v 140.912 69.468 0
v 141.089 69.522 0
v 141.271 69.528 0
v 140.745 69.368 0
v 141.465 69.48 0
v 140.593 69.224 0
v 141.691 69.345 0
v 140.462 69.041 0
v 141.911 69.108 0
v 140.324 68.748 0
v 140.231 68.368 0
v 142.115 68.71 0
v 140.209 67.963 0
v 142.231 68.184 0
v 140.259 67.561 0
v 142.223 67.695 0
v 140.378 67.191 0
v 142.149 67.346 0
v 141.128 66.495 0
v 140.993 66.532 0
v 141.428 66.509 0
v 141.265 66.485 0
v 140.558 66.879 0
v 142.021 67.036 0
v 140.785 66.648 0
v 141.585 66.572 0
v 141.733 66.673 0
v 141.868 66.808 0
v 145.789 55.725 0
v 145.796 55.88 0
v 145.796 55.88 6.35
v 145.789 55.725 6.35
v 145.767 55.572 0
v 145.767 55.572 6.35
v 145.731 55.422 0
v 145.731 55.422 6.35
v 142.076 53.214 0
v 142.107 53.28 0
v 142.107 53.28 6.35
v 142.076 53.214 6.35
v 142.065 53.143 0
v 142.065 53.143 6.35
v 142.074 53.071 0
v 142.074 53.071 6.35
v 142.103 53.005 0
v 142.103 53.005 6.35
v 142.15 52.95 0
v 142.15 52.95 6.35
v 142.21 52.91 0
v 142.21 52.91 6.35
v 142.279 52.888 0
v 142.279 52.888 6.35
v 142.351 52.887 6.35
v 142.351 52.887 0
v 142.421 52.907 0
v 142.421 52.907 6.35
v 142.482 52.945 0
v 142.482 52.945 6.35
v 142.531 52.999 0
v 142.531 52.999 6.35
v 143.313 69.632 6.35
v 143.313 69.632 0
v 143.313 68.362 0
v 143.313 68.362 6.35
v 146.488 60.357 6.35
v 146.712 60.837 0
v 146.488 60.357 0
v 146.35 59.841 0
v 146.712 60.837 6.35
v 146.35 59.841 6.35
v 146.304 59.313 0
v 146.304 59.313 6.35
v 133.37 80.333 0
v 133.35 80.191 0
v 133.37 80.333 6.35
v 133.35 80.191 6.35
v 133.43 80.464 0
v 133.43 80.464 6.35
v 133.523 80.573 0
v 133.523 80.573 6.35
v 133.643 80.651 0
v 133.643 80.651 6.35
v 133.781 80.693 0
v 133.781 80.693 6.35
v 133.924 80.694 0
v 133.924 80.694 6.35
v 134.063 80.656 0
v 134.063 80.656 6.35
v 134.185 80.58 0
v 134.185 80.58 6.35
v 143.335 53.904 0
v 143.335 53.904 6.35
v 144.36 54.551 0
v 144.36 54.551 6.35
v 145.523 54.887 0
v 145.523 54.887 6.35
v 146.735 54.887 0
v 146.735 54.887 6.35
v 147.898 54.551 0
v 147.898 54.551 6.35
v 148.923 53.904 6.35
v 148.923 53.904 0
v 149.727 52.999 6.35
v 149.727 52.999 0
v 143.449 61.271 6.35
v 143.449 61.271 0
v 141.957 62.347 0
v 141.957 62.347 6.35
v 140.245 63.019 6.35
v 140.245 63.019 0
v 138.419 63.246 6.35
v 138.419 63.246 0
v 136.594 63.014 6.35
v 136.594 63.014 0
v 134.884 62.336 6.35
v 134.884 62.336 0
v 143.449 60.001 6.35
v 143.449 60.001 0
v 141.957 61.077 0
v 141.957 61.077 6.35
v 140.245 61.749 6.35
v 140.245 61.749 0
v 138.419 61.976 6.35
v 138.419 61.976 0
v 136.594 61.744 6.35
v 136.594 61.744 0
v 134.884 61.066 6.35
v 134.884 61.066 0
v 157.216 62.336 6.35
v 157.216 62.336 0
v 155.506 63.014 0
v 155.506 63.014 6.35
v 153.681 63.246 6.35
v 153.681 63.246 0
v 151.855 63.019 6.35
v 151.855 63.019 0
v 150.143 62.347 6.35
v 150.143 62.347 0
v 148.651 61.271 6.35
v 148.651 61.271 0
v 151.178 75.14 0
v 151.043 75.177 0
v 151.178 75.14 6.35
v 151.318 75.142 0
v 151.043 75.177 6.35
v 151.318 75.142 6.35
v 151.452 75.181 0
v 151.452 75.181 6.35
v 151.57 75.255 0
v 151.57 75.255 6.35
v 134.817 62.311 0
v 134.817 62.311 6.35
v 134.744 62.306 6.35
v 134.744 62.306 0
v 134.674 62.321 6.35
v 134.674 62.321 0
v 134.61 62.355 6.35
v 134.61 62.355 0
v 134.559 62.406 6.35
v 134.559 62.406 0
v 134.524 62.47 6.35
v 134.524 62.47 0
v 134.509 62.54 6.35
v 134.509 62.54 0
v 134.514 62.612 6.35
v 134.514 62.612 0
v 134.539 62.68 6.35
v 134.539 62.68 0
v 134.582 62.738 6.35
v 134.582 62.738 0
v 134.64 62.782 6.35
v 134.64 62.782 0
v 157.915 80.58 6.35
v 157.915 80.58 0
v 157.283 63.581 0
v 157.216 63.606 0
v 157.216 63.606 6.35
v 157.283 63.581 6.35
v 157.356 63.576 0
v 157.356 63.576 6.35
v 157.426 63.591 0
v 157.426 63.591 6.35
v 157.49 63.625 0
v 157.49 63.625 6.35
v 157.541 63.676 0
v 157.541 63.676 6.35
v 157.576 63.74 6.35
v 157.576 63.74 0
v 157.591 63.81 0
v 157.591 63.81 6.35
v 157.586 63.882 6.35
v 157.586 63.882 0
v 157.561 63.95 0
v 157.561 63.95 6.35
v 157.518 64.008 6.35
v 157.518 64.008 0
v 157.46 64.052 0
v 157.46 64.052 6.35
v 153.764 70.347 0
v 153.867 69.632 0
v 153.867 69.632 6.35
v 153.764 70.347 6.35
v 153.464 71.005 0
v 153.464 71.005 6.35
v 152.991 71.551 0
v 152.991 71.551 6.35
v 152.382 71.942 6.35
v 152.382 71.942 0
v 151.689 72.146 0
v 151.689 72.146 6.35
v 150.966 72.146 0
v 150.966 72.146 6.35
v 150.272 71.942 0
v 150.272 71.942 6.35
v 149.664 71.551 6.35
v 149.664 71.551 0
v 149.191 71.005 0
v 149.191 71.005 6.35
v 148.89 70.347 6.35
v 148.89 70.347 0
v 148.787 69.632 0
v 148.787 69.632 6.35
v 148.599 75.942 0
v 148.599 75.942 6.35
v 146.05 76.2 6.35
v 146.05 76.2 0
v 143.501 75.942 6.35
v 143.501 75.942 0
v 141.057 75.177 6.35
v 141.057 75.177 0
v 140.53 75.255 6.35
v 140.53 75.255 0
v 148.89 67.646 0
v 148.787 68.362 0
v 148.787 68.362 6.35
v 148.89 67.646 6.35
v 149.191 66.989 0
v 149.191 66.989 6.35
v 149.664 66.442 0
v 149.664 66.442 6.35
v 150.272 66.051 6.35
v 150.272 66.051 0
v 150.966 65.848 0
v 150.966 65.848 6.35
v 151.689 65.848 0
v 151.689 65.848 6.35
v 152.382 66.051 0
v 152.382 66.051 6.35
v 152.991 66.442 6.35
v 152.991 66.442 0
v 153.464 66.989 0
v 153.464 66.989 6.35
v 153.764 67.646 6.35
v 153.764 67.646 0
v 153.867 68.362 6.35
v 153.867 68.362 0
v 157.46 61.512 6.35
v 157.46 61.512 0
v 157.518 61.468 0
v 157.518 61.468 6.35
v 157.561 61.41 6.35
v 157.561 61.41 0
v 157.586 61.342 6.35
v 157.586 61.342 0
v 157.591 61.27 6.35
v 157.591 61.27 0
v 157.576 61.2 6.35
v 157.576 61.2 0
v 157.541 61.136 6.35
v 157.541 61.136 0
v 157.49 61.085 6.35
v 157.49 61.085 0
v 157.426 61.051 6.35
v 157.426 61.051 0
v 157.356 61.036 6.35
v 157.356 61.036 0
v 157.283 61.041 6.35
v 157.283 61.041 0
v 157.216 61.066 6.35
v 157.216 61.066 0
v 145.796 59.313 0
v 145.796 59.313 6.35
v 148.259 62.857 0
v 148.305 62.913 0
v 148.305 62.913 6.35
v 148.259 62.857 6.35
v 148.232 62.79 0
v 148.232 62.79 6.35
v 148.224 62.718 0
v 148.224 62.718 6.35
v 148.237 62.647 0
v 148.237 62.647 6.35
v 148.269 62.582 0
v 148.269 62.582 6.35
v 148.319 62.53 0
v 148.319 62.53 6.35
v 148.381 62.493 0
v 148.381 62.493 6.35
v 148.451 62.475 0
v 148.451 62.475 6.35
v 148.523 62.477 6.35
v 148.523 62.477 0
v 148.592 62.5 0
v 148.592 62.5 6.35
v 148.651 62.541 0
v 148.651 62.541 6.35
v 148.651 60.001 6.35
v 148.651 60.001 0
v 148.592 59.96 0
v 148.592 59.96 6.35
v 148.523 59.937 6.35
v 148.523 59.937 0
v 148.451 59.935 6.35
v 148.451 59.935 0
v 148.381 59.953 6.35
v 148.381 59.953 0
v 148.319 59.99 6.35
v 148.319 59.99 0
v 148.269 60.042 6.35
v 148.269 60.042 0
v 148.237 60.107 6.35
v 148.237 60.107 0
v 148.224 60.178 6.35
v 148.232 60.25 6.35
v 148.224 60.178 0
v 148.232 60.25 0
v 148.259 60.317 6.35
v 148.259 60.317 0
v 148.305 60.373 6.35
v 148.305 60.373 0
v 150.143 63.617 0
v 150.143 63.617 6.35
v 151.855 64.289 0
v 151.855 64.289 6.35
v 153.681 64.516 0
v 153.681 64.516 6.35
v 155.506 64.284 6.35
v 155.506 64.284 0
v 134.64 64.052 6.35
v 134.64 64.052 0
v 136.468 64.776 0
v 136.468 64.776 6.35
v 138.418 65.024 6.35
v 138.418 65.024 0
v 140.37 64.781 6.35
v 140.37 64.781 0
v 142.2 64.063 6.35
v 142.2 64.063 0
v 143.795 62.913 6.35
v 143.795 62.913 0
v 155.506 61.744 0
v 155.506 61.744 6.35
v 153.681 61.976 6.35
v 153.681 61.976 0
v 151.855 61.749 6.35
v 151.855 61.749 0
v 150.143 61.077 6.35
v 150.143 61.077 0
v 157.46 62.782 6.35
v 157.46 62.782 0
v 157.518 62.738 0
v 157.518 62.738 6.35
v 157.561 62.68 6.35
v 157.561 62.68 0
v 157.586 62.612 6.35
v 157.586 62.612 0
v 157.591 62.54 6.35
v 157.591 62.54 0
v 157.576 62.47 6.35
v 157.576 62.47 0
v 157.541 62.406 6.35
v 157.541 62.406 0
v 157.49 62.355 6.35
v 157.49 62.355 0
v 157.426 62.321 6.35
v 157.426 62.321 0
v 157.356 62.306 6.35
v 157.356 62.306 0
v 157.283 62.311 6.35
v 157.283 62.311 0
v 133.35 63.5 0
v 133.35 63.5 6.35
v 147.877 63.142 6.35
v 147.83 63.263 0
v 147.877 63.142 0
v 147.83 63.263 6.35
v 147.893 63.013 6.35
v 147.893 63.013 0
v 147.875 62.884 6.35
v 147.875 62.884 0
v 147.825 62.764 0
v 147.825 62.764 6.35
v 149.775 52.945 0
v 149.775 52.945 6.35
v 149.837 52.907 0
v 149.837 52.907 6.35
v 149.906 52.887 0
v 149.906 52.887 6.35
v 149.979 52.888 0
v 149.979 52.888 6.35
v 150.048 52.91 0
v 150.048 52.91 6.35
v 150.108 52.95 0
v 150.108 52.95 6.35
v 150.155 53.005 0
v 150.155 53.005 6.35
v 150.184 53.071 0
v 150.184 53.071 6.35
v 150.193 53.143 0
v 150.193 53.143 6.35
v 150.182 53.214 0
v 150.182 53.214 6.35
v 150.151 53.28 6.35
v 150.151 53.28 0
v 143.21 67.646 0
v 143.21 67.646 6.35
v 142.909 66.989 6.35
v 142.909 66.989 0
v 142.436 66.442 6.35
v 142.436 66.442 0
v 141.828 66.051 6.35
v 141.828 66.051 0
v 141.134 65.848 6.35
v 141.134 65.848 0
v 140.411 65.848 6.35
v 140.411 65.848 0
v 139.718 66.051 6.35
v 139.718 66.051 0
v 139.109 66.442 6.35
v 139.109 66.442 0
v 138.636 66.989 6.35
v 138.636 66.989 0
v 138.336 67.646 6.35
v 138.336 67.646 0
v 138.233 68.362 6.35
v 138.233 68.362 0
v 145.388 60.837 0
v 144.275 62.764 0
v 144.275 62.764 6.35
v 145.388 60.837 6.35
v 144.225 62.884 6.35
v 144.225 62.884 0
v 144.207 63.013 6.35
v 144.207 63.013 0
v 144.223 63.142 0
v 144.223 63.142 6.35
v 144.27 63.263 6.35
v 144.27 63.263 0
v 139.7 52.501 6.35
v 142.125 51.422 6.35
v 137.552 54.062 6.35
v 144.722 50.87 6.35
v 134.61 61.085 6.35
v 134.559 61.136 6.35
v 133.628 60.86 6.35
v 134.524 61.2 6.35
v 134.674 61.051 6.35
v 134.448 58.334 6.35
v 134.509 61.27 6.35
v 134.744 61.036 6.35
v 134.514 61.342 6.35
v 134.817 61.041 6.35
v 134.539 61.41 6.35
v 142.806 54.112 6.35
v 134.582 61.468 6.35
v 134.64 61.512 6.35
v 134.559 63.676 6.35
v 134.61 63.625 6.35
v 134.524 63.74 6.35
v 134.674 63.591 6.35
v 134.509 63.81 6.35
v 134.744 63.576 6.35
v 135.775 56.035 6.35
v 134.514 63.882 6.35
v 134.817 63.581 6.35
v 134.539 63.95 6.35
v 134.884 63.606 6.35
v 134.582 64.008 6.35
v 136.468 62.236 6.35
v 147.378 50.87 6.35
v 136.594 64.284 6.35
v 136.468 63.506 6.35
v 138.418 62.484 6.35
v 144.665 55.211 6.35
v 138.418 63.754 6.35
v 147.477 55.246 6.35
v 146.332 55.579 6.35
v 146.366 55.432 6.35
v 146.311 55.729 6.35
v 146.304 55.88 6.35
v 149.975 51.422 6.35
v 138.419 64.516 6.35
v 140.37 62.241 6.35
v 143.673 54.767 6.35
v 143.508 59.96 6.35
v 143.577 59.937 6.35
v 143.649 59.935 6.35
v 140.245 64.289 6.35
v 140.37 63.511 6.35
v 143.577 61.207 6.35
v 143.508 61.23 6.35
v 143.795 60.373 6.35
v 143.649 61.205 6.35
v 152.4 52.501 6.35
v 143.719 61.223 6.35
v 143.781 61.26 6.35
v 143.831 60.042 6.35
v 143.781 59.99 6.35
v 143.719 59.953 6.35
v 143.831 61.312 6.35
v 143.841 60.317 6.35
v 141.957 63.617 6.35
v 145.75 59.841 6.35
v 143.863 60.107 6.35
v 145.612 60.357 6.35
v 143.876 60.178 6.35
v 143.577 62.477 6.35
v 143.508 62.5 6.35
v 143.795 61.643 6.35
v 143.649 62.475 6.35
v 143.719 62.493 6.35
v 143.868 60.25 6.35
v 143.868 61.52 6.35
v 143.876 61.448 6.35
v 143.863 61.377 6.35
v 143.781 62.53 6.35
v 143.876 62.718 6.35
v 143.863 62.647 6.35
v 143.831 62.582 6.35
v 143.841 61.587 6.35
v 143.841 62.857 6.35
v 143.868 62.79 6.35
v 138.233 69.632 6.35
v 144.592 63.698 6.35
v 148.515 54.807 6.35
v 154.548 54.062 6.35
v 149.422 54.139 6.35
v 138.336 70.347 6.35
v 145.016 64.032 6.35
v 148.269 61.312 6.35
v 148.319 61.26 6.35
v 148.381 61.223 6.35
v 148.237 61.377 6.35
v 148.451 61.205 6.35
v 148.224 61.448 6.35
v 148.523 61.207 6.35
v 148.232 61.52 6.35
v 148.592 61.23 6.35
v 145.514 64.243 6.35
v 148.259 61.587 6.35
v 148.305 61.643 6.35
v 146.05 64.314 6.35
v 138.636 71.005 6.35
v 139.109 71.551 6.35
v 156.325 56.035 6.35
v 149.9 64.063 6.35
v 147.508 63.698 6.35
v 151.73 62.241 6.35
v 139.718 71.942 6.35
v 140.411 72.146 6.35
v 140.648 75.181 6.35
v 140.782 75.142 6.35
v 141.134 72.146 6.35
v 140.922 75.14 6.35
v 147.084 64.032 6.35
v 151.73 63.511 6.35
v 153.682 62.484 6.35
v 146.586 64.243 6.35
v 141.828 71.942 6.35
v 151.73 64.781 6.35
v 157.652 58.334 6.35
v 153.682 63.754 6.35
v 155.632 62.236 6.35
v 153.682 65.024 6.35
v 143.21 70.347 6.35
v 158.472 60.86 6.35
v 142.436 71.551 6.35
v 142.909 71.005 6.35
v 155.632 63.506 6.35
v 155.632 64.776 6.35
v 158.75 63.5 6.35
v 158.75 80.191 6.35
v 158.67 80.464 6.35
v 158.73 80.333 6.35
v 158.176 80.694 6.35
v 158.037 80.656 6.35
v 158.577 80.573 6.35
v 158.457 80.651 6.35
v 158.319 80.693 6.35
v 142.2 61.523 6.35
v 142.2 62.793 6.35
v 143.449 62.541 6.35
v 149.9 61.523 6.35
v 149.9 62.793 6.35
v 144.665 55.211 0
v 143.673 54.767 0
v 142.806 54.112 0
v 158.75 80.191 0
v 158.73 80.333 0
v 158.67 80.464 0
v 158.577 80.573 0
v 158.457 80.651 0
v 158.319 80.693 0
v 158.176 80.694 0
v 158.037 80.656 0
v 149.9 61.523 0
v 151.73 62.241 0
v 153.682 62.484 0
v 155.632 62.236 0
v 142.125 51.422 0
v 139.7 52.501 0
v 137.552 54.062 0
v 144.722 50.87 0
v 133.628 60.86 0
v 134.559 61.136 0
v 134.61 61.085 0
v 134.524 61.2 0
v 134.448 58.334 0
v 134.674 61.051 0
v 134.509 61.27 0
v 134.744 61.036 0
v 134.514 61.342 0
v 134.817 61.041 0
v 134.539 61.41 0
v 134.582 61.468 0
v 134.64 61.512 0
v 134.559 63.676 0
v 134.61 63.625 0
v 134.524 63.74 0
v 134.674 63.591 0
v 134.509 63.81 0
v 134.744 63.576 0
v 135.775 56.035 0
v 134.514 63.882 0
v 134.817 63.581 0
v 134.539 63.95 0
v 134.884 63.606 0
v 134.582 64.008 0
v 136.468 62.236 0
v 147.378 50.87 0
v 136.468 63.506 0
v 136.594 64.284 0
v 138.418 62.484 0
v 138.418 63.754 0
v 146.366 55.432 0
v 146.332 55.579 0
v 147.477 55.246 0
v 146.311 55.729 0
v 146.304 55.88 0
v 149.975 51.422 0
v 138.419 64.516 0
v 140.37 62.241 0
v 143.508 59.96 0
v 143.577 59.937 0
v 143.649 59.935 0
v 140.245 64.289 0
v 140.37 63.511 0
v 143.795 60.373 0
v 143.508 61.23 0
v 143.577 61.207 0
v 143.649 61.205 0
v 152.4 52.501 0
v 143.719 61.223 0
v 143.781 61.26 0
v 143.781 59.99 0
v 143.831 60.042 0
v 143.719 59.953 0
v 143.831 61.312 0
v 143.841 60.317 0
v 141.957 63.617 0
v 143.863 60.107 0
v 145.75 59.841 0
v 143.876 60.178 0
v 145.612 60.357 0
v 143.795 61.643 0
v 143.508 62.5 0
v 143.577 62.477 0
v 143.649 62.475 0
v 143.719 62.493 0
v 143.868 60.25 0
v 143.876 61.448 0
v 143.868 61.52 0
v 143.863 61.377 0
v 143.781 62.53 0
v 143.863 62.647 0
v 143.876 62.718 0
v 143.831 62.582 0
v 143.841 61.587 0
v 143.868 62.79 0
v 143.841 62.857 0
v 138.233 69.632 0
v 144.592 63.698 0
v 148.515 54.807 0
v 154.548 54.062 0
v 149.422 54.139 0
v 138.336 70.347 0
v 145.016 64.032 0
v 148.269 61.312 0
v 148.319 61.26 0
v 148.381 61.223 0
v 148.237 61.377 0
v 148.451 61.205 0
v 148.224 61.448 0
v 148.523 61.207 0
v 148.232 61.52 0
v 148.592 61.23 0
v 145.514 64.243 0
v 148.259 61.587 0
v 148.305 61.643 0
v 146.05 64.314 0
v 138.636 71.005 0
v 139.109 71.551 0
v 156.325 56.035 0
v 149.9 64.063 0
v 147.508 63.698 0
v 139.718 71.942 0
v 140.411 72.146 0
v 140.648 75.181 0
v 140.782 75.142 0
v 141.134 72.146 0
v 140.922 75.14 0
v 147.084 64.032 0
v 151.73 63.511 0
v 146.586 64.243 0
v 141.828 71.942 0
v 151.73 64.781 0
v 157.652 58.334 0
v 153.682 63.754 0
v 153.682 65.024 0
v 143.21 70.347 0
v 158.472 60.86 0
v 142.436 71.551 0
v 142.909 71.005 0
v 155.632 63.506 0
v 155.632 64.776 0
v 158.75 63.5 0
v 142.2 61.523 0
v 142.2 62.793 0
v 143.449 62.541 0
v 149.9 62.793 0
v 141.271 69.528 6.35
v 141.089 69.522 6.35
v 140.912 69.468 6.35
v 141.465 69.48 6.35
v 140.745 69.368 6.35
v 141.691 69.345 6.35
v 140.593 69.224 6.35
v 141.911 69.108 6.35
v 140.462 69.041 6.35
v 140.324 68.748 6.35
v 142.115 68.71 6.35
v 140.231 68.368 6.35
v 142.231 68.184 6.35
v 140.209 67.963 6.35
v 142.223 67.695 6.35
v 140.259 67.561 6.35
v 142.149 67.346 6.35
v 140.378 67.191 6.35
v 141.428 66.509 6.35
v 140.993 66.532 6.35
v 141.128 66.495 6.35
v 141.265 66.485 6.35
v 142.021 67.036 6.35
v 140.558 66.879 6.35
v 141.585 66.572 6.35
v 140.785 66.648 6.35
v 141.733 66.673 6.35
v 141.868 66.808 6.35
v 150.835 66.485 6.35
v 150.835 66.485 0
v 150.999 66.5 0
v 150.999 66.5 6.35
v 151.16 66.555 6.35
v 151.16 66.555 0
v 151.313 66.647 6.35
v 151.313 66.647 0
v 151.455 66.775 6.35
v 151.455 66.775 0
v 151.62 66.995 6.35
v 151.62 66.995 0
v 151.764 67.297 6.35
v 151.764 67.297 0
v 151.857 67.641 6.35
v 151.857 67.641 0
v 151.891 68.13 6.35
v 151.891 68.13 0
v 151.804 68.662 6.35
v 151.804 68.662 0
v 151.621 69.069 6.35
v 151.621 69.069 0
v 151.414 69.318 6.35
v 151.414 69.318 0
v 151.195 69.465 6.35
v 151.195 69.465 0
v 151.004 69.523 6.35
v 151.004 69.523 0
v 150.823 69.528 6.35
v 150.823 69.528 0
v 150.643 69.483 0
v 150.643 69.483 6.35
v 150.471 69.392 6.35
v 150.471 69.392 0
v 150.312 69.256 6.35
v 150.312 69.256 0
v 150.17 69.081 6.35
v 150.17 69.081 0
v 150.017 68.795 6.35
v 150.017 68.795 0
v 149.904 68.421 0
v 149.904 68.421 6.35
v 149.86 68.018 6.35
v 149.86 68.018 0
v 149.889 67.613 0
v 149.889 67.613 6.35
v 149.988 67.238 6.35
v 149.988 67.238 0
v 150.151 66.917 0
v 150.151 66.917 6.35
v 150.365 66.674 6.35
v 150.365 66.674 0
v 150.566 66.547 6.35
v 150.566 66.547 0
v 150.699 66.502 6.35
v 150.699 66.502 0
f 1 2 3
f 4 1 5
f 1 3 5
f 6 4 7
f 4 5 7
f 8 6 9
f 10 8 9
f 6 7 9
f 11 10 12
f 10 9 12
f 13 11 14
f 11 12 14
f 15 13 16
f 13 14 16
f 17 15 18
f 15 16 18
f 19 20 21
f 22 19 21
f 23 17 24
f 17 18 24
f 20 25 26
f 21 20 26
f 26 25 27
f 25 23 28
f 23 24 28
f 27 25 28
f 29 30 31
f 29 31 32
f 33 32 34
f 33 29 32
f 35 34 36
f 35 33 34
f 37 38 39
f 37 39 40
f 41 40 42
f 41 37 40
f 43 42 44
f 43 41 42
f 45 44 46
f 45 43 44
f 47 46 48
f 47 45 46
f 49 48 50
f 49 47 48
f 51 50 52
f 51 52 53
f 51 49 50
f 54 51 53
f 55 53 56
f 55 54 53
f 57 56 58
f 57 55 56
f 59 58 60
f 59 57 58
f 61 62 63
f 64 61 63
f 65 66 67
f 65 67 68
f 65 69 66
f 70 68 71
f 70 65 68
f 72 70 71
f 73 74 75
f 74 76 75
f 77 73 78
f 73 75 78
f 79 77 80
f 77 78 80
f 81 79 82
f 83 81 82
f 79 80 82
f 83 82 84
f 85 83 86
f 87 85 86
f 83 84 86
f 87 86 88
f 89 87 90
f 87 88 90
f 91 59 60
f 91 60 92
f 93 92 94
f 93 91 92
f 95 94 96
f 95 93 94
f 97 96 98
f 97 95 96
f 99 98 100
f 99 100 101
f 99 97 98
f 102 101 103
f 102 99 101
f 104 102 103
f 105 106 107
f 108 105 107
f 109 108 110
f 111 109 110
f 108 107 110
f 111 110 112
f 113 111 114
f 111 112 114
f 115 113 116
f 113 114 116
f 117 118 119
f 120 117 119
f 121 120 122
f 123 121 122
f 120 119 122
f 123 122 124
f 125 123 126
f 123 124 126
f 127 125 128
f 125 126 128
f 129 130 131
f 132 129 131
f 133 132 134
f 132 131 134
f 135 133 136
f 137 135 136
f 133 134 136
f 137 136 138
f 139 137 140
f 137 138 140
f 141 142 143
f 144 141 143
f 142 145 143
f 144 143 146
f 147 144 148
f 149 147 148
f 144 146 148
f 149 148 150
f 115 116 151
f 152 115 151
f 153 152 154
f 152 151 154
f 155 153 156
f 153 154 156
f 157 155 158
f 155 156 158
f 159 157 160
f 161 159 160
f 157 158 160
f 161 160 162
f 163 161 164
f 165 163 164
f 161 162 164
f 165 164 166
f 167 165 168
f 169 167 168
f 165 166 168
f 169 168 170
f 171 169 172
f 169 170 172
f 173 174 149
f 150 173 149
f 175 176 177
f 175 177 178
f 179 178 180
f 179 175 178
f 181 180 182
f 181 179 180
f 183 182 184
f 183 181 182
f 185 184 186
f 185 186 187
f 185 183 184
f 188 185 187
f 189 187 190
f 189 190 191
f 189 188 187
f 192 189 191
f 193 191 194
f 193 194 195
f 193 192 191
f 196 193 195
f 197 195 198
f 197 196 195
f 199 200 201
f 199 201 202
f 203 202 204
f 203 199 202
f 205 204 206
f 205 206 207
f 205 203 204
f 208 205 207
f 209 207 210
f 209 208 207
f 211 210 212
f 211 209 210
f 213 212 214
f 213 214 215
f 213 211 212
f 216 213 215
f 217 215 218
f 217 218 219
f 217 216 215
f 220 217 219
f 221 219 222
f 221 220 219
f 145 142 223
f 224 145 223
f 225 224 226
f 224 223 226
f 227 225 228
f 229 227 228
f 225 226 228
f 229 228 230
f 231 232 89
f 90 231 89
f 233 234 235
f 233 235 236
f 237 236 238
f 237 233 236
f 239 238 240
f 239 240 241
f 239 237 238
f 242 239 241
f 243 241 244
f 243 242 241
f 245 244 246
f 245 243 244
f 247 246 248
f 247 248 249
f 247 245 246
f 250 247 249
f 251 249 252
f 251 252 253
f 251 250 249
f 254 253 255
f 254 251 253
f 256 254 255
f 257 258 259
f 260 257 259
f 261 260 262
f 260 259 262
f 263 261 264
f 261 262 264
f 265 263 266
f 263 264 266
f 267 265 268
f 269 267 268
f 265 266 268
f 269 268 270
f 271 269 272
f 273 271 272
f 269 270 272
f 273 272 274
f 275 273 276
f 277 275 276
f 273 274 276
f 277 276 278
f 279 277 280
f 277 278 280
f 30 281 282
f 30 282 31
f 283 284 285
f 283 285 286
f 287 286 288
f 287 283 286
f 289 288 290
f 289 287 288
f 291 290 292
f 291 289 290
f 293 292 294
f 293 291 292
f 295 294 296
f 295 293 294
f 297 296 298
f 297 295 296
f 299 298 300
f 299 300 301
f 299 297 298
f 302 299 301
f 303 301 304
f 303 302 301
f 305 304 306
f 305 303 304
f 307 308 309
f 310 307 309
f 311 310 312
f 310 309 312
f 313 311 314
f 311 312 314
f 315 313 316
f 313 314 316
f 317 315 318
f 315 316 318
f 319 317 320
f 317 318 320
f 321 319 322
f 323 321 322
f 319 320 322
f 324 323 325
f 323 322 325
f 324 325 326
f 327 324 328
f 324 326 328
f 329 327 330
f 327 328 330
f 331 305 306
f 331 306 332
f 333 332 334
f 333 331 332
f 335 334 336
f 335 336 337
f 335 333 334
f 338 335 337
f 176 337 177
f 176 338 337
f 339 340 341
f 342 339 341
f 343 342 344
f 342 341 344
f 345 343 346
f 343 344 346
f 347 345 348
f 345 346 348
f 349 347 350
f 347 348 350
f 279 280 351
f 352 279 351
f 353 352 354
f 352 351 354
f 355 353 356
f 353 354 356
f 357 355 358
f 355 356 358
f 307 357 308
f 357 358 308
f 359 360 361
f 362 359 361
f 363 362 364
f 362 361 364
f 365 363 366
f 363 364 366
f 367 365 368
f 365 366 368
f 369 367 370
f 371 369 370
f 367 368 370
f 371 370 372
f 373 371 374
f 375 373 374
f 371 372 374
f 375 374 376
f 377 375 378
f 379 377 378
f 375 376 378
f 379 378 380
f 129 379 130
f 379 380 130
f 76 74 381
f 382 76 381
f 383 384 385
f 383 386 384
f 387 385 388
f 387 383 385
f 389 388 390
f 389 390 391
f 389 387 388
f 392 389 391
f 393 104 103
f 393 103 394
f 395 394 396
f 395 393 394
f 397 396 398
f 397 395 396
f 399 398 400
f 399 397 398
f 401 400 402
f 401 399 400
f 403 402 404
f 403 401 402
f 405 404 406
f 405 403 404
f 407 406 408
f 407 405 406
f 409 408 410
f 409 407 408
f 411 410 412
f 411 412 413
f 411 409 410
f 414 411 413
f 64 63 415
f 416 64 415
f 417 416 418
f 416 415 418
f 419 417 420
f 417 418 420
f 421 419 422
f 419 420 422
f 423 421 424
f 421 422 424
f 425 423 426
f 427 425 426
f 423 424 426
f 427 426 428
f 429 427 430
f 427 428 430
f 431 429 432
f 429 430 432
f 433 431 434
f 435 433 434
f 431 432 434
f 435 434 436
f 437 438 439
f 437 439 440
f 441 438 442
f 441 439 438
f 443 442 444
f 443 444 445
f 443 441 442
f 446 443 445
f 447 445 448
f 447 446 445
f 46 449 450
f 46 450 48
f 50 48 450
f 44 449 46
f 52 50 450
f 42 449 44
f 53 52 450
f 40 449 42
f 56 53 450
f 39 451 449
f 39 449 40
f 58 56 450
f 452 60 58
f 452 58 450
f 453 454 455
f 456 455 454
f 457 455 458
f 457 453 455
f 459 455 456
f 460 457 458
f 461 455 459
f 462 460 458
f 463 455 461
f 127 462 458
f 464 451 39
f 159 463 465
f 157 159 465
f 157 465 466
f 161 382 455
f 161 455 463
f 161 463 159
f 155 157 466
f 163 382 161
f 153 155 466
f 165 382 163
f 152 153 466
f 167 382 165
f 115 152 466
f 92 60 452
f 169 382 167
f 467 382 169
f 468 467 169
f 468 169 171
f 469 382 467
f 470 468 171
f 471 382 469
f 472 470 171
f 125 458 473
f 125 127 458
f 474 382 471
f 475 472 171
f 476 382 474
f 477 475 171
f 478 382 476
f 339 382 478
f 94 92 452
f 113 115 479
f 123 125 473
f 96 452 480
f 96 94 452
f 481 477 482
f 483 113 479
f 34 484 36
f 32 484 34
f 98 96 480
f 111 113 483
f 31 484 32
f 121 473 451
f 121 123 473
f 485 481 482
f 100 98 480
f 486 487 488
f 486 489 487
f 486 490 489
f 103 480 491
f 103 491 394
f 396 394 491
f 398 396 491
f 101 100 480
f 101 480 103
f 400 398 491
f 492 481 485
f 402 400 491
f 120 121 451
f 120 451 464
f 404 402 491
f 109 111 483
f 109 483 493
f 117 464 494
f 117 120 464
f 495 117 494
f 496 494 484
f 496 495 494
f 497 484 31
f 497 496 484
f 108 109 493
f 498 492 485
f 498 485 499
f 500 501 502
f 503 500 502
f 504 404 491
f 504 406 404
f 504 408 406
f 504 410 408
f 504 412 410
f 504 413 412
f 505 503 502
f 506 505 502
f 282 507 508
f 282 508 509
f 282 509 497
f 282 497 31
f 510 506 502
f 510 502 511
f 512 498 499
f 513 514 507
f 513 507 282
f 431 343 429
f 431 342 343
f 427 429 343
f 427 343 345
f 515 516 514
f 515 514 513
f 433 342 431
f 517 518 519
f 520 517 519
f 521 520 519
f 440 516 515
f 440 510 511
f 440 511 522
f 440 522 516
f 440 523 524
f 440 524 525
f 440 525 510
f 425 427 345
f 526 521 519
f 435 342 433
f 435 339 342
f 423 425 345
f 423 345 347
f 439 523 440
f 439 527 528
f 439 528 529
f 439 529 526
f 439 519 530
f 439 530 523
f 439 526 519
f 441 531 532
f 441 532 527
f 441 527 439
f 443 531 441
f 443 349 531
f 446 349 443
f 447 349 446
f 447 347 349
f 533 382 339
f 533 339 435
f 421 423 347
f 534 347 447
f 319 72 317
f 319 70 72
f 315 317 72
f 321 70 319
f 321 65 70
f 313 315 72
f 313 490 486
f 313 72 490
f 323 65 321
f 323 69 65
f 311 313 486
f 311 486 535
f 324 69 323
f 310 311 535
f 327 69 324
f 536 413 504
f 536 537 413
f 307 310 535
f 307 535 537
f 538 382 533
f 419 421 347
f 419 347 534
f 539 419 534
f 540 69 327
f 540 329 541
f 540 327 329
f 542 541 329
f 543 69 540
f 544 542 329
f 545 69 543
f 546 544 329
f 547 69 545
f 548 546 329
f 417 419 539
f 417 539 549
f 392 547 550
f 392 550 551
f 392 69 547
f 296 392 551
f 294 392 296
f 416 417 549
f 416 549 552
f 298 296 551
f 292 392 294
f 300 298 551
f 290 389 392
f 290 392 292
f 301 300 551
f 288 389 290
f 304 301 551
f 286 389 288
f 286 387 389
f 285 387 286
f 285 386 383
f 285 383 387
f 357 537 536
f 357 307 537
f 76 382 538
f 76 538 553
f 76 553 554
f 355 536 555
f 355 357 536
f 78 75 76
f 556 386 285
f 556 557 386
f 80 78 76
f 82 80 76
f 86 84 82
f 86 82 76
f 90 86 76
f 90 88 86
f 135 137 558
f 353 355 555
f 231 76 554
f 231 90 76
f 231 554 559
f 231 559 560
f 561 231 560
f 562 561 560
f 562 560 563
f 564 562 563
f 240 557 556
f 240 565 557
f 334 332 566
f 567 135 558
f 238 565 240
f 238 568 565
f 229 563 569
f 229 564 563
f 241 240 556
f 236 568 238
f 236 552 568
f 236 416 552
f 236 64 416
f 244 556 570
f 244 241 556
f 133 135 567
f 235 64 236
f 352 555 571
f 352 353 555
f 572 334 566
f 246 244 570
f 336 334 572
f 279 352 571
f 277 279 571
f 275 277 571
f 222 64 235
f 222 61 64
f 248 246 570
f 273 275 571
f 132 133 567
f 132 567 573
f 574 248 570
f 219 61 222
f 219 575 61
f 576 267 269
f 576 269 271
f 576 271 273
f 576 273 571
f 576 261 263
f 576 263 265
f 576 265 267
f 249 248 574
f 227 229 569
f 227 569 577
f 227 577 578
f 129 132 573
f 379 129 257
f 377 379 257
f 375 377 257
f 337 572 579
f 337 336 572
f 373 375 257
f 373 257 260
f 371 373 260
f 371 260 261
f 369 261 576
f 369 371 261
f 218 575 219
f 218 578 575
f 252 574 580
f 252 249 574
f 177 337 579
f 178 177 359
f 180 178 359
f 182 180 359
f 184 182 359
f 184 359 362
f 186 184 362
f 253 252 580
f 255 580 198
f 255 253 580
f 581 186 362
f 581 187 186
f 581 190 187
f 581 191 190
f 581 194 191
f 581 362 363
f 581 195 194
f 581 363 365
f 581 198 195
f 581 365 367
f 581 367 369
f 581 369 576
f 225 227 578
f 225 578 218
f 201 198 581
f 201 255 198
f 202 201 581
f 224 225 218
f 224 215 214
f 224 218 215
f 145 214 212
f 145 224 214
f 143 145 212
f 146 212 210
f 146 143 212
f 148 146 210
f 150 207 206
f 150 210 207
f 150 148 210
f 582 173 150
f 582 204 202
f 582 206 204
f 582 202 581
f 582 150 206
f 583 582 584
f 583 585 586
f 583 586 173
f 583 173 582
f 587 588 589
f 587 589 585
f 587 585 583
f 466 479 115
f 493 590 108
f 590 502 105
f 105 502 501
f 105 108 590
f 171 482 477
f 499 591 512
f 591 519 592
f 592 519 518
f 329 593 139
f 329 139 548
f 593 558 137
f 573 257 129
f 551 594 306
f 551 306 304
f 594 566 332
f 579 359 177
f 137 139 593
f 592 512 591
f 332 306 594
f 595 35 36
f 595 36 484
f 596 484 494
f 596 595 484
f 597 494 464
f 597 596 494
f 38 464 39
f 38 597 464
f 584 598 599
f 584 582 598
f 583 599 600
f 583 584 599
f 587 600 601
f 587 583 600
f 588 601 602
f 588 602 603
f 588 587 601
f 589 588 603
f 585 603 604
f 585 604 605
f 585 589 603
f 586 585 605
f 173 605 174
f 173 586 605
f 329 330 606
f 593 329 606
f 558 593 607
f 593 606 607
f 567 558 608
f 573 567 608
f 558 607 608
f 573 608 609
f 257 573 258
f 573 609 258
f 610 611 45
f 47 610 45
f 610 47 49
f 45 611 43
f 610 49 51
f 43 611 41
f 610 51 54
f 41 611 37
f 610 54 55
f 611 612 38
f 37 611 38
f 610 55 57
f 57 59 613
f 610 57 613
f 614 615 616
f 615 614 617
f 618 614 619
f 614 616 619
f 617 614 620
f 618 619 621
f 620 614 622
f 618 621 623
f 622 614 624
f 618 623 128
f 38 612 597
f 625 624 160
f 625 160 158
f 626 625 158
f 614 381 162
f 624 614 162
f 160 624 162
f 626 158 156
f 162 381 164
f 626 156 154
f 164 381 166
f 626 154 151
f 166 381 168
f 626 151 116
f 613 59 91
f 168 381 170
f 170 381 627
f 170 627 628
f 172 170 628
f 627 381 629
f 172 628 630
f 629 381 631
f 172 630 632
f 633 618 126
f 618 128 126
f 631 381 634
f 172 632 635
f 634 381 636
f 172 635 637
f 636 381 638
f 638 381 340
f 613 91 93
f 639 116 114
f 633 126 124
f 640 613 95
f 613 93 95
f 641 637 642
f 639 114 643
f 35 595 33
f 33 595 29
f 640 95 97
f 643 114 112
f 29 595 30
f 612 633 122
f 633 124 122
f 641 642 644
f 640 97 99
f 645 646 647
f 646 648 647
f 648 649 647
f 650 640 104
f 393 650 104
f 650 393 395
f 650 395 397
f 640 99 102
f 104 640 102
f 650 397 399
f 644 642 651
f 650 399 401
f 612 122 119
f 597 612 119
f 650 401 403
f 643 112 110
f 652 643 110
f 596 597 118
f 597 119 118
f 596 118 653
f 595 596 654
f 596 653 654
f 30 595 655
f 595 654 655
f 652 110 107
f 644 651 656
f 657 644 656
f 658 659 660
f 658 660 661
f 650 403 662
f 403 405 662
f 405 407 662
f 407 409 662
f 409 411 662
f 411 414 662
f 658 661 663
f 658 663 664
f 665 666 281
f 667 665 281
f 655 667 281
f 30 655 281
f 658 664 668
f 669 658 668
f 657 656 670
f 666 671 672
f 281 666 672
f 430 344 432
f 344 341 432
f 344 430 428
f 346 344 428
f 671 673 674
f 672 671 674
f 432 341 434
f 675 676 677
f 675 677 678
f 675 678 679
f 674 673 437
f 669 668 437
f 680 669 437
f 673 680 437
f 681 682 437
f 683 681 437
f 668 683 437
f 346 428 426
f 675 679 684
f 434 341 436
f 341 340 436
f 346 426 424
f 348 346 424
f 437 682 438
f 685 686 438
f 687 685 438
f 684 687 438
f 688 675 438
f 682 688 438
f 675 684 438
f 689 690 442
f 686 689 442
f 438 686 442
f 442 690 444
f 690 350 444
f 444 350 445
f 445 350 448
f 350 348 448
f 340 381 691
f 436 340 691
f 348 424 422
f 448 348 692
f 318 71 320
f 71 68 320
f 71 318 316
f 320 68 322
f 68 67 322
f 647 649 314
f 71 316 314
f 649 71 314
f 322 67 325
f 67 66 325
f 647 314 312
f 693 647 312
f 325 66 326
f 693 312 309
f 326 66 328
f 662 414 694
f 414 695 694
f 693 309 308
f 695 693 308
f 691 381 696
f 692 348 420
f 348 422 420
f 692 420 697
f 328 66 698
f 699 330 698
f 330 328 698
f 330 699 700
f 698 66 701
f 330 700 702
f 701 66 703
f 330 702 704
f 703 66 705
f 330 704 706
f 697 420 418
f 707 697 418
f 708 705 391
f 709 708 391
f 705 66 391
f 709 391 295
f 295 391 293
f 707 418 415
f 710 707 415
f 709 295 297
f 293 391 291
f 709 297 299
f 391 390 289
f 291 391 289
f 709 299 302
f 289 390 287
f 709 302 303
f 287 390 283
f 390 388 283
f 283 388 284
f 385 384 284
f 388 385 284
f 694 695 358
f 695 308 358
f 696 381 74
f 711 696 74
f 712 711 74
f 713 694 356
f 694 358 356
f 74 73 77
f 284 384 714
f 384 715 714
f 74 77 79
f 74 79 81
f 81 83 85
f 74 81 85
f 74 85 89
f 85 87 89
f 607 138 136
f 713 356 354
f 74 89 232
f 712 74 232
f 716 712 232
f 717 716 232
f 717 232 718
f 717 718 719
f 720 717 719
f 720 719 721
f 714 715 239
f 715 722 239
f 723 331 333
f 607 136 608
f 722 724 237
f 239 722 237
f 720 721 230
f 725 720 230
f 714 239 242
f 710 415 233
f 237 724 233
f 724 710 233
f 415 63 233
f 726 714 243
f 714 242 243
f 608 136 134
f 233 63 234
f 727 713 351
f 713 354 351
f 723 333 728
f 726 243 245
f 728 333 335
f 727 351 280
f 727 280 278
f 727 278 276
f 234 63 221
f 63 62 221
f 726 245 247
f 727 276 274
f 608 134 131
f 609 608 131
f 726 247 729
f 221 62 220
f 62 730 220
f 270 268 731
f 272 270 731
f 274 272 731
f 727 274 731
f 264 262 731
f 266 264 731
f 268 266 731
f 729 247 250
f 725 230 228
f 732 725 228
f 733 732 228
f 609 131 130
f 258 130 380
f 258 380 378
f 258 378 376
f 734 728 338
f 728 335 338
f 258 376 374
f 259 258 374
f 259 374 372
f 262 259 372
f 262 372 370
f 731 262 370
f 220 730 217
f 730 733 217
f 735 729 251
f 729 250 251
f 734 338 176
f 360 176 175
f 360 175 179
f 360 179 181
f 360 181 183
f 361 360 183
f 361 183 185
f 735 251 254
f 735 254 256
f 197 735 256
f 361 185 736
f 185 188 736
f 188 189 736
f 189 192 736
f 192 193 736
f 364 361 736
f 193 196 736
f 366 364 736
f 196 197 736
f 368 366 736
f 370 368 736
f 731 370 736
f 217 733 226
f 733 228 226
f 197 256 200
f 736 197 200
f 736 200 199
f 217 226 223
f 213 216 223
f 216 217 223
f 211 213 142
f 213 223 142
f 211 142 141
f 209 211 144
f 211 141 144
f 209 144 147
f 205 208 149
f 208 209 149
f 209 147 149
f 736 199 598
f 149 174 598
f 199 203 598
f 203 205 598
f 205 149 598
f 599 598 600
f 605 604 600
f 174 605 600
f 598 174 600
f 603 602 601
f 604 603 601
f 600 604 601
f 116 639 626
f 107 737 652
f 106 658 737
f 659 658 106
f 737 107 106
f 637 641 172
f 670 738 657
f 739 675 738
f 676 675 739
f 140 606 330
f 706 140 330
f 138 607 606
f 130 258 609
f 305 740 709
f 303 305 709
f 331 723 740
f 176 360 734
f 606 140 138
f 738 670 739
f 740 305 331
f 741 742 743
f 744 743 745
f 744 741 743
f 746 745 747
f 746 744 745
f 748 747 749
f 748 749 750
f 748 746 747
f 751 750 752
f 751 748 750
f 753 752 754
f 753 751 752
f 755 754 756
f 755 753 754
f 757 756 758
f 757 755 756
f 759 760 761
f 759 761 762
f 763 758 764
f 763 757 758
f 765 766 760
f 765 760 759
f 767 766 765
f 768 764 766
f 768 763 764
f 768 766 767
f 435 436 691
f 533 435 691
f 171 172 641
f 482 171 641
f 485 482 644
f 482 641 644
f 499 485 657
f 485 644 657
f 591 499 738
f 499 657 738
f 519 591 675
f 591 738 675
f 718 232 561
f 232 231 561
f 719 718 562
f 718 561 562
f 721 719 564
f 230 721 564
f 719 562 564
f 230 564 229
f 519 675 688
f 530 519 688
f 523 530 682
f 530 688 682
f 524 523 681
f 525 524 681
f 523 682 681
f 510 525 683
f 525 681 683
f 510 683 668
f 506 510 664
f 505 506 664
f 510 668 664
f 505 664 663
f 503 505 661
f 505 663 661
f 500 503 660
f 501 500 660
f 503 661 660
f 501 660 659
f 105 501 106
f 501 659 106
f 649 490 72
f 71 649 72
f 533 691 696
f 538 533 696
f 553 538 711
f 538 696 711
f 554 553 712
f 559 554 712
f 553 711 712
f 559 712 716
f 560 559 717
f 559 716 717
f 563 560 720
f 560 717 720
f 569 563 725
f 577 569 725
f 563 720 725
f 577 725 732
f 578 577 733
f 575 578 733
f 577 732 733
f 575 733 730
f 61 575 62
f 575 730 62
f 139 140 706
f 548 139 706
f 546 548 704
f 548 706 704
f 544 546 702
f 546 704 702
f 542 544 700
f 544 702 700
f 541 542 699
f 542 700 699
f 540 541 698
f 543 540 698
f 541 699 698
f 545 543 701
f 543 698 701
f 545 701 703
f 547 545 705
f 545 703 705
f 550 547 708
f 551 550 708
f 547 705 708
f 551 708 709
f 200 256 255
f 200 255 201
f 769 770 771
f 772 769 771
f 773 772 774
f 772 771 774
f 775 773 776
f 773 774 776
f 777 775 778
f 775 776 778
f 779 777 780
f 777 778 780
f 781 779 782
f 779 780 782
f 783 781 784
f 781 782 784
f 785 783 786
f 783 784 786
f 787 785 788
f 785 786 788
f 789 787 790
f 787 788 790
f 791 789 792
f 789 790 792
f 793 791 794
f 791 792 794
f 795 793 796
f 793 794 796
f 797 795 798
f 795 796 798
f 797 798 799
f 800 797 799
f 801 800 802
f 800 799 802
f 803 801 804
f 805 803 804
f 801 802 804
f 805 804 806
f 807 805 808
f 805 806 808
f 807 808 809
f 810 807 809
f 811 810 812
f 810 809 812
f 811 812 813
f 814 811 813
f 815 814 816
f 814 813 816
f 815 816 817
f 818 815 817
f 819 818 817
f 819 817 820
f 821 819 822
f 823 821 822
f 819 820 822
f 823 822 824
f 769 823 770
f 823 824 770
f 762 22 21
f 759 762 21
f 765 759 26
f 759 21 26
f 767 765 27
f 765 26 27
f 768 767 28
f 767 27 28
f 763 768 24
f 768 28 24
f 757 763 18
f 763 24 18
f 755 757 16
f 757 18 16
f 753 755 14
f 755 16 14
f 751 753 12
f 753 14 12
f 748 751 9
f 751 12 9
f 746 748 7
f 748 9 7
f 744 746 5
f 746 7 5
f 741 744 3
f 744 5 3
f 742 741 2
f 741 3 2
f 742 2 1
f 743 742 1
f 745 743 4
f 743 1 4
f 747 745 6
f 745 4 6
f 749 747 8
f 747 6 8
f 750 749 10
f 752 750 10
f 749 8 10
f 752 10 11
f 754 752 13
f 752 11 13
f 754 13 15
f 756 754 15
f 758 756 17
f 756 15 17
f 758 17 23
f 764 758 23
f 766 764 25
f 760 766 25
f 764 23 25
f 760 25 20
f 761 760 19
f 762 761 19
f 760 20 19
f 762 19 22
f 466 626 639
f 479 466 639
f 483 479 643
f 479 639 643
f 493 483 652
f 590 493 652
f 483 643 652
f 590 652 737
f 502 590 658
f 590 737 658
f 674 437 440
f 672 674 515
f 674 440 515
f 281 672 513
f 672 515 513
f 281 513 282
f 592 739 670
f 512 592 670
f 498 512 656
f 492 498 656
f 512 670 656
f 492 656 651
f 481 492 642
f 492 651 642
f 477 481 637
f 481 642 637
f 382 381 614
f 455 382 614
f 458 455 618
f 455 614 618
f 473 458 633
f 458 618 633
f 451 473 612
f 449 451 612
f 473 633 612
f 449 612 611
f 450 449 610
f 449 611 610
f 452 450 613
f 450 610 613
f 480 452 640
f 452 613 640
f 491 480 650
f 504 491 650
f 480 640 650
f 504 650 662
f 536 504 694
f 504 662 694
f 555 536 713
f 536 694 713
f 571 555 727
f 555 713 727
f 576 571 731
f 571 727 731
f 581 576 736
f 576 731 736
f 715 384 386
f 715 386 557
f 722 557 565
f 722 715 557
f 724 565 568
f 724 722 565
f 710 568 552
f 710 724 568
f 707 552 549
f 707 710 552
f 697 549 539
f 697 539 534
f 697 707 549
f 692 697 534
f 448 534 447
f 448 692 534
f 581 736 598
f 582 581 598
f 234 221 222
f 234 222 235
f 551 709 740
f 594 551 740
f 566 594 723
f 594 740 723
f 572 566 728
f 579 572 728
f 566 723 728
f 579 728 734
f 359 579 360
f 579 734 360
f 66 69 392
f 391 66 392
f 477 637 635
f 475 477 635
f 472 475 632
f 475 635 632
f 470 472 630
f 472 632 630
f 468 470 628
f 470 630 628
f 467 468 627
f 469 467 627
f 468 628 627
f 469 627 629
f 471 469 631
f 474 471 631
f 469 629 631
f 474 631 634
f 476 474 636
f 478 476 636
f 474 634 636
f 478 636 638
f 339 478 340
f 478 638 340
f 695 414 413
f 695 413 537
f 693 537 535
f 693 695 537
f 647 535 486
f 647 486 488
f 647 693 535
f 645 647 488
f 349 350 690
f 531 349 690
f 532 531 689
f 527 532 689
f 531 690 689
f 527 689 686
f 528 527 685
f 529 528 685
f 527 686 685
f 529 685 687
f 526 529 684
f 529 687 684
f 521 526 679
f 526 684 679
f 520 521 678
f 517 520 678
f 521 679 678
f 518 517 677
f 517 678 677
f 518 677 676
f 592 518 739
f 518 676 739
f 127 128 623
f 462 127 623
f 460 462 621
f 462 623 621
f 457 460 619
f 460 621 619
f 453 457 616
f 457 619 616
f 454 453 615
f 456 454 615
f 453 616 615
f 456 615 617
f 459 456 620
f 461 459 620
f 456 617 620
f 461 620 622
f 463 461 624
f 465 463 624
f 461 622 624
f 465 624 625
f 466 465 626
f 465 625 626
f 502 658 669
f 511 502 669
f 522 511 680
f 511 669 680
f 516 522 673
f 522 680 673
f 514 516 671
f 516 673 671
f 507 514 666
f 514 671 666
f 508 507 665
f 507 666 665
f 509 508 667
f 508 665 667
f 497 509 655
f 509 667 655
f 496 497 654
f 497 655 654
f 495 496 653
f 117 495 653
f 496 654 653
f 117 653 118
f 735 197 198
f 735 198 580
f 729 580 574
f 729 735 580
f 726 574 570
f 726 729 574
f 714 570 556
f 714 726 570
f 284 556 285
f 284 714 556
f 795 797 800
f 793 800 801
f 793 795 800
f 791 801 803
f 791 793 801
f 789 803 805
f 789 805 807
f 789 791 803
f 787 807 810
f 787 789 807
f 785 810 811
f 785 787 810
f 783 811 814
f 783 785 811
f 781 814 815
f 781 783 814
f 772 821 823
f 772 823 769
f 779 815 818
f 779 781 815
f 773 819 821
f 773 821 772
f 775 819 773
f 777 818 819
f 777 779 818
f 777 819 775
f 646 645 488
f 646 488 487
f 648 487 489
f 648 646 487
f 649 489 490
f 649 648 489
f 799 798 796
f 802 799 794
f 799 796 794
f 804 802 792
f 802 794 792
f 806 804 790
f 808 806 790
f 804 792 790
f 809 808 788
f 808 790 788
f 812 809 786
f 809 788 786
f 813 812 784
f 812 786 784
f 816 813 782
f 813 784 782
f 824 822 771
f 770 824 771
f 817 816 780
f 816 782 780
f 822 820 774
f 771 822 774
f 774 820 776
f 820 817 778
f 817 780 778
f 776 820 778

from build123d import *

# Parameters (mm, degrees)
SKETCH1_RX            = 1.524
SKETCH1_RY            = 1.016
BOSS_EXTRUDE1_DEPTH   = 6.35
BOSS_EXTRUDE1_2_DEPTH = 6.35
BOSS_EXTRUDE1_3_DEPTH = 6.35
FILLET1_R             = 0.508
FILLET2_R             = 3.048


with BuildPart() as part:
    # Sketch1 → Boss-Extrude1 (new body)
    with BuildSketch(Plane.XY):
        with Locations(Location((141.224, 68.008052795), (0, 0, -88.460840042))):
            Ellipse(SKETCH1_RX, SKETCH1_RY)
    extrude(amount=BOSS_EXTRUDE1_DEPTH)


with BuildPart() as body_2:
    # Sketch1 → Boss-Extrude1 2 (new body)
    with BuildSketch(Plane.XY):
        with Locations(Location((150.876, 68.008052795), (0, 0, -91.539159958))):
            Ellipse(SKETCH1_RX, SKETCH1_RY)
    extrude(amount=BOSS_EXTRUDE1_2_DEPTH)


with BuildPart() as body_3:
    # Sketch1 → Boss-Extrude1 3 (new body)
    with BuildSketch(Plane.XY):
        with BuildLine():
            Line((133.35, 81.28), (133.35, 63.5))
            ThreePointArc((133.35, 63.5), (146.05, 50.8), (158.75, 63.5))
            Line((158.75, 63.5), (158.75, 81.28))
            Line((158.75, 81.28), (151.327309744, 75.051623344))
            ThreePointArc((151.327309744, 75.051623344), (146.05, 76.2), (140.772690256, 75.051623344))
            Line((140.772690256, 75.051623344), (133.35, 81.28))
        make_face()
        with BuildLine():
            Line((145.796, 59.69), (145.796, 55.88))
            ThreePointArc((145.796, 55.88), (145.779685122, 55.648471272), (145.73106293, 55.421518393))
            ThreePointArc((145.73106293, 55.421518393), (143.673299342, 54.766502726), (142.10722074, 53.279615266))
            ThreePointArc((142.10722074, 53.279615266), (142.178483624, 52.927544816), (142.530554073, 52.9988077))
            ThreePointArc((142.530554073, 52.9988077), (146.128887407, 54.929943393), (149.72722074, 52.9988077))
            ThreePointArc((149.72722074, 52.9988077), (150.07929119, 52.927544816), (150.150554073, 53.279615266))
            ThreePointArc((150.150554073, 53.279615266), (148.5147686, 54.806922169), (146.36591099, 55.432119305))
            ThreePointArc((146.36591099, 55.432119305), (146.319550986, 55.653930272), (146.304, 55.88))
            Line((146.304, 55.88), (146.304, 59.69))
            ThreePointArc((146.304, 59.69), (146.269970453, 59.817), (146.177, 59.909970453))
            Line((146.177, 59.909970453), (147.955, 62.989556788))
            ThreePointArc((147.955, 62.989556788), (146.05, 64.314450714), (144.145, 62.989556788))
            Line((144.145, 62.989556788), (145.923, 59.909970453))
            ThreePointArc((145.923, 59.909970453), (145.830029547, 59.817), (145.796, 59.69))
        make_face(mode=Mode.SUBTRACT)
        with BuildLine():
            Line((143.312690256, 69.631762854), (143.312690256, 68.361762854))
            ThreePointArc((143.312690256, 68.361762854), (140.772690256, 65.821762854), (138.232690256, 68.361762854))
            Line((138.232690256, 68.361762854), (138.232690256, 69.631762854))
            ThreePointArc((138.232690256, 69.631762854), (140.772690256, 72.171762854), (143.312690256, 69.631762854))
        make_face(mode=Mode.SUBTRACT)
        with BuildLine():
            Line((148.787309744, 69.631762854), (148.787309744, 68.361762854))
            ThreePointArc((148.787309744, 68.361762854), (151.327309744, 65.821762854), (153.867309744, 68.361762854))
            Line((153.867309744, 68.361762854), (153.867309744, 69.631762854))
            ThreePointArc((153.867309744, 69.631762854), (151.327309744, 72.171762854), (148.787309744, 69.631762854))
        make_face(mode=Mode.SUBTRACT)
        with BuildLine():
            ThreePointArc((148.304846636, 61.64324608), (152.698387061, 63.693823923), (157.460327288, 62.781687841))
            ThreePointArc((157.460327288, 62.781687841), (157.560693757, 62.436784127), (157.215790043, 62.336417658))
            ThreePointArc((157.215790043, 62.336417658), (152.761071767, 63.18970625), (148.650985563, 61.271423753))
            ThreePointArc((148.650985563, 61.271423753), (148.292004936, 61.284265453), (148.304846636, 61.64324608))
        make_face(mode=Mode.SUBTRACT)
        with BuildLine():
            ThreePointArc((148.650985563, 62.541423753), (152.761071767, 64.45970625), (157.215790043, 63.606417658))
            ThreePointArc((157.215790043, 63.606417658), (157.560693757, 63.706784127), (157.460327288, 64.051687841))
            ThreePointArc((157.460327288, 64.051687841), (152.698387061, 64.963823923), (148.304846636, 62.91324608))
            ThreePointArc((148.304846636, 62.91324608), (148.292004936, 62.554265453), (148.650985563, 62.541423753))
        make_face(mode=Mode.SUBTRACT)
        with BuildLine():
            ThreePointArc((148.304846636, 60.37324608), (152.698387061, 62.423823923), (157.460327288, 61.511687841))
            ThreePointArc((157.460327288, 61.511687841), (157.560693757, 61.166784127), (157.215790043, 61.066417658))
            ThreePointArc((157.215790043, 61.066417658), (152.761071767, 61.91970625), (148.650985563, 60.001423753))
            ThreePointArc((148.650985563, 60.001423753), (148.292004936, 60.014265453), (148.304846636, 60.37324608))
        make_face(mode=Mode.SUBTRACT)
        with BuildLine():
            ThreePointArc((134.884209957, 62.336417658), (134.539306243, 62.436784127), (134.639672712, 62.781687841))
            ThreePointArc((134.639672712, 62.781687841), (139.401612939, 63.693823923), (143.795153364, 61.64324608))
            ThreePointArc((143.795153364, 61.64324608), (143.807995064, 61.284265453), (143.449014437, 61.271423753))
            ThreePointArc((143.449014437, 61.271423753), (139.338928233, 63.18970625), (134.884209957, 62.336417658))
        make_face(mode=Mode.SUBTRACT)
        with BuildLine():
            ThreePointArc((134.884209957, 61.066417658), (134.539306243, 61.166784127), (134.639672712, 61.511687841))
            ThreePointArc((134.639672712, 61.511687841), (139.401612939, 62.423823923), (143.795153364, 60.37324608))
            ThreePointArc((143.795153364, 60.37324608), (143.807995064, 60.014265453), (143.449014437, 60.001423753))
            ThreePointArc((143.449014437, 60.001423753), (139.338928233, 61.91970625), (134.884209957, 61.066417658))
        make_face(mode=Mode.SUBTRACT)
        with BuildLine():
            ThreePointArc((134.884209957, 63.606417658), (134.539306243, 63.706784127), (134.639672712, 64.051687841))
            ThreePointArc((134.639672712, 64.051687841), (139.401612939, 64.963823923), (143.795153364, 62.91324608))
            ThreePointArc((143.795153364, 62.91324608), (143.807995064, 62.554265453), (143.449014437, 62.541423753))
            ThreePointArc((143.449014437, 62.541423753), (139.338928233, 64.45970625), (134.884209957, 63.606417658))
        make_face(mode=Mode.SUBTRACT)
    extrude(amount=BOSS_EXTRUDE1_3_DEPTH)

    # Fillet1
    fillet1_edges = [body_3.edges().sort_by_distance(p)[0] for p in [
        (133.35, 81.28, 3.175),
        (140.772690256, 75.051623344, 3.175),
        (151.327309744, 75.051623344, 3.175),
        (158.75, 81.28, 3.175),
        (147.955, 62.989556788, 3.175),
        (144.145, 62.989556788, 3.175),
    ]]
    fillet(fillet1_edges, radius=FILLET1_R)

    # Fillet2
    fillet2_edges = [body_3.edges().sort_by_distance(p)[0] for p in [
        (146.177, 59.909970453, 3.175),
        (145.923, 59.909970453, 3.175),
    ]]
    fillet(fillet2_edges, radius=FILLET2_R)


solid = Compound([part.part, body_2.part, body_3.part])
